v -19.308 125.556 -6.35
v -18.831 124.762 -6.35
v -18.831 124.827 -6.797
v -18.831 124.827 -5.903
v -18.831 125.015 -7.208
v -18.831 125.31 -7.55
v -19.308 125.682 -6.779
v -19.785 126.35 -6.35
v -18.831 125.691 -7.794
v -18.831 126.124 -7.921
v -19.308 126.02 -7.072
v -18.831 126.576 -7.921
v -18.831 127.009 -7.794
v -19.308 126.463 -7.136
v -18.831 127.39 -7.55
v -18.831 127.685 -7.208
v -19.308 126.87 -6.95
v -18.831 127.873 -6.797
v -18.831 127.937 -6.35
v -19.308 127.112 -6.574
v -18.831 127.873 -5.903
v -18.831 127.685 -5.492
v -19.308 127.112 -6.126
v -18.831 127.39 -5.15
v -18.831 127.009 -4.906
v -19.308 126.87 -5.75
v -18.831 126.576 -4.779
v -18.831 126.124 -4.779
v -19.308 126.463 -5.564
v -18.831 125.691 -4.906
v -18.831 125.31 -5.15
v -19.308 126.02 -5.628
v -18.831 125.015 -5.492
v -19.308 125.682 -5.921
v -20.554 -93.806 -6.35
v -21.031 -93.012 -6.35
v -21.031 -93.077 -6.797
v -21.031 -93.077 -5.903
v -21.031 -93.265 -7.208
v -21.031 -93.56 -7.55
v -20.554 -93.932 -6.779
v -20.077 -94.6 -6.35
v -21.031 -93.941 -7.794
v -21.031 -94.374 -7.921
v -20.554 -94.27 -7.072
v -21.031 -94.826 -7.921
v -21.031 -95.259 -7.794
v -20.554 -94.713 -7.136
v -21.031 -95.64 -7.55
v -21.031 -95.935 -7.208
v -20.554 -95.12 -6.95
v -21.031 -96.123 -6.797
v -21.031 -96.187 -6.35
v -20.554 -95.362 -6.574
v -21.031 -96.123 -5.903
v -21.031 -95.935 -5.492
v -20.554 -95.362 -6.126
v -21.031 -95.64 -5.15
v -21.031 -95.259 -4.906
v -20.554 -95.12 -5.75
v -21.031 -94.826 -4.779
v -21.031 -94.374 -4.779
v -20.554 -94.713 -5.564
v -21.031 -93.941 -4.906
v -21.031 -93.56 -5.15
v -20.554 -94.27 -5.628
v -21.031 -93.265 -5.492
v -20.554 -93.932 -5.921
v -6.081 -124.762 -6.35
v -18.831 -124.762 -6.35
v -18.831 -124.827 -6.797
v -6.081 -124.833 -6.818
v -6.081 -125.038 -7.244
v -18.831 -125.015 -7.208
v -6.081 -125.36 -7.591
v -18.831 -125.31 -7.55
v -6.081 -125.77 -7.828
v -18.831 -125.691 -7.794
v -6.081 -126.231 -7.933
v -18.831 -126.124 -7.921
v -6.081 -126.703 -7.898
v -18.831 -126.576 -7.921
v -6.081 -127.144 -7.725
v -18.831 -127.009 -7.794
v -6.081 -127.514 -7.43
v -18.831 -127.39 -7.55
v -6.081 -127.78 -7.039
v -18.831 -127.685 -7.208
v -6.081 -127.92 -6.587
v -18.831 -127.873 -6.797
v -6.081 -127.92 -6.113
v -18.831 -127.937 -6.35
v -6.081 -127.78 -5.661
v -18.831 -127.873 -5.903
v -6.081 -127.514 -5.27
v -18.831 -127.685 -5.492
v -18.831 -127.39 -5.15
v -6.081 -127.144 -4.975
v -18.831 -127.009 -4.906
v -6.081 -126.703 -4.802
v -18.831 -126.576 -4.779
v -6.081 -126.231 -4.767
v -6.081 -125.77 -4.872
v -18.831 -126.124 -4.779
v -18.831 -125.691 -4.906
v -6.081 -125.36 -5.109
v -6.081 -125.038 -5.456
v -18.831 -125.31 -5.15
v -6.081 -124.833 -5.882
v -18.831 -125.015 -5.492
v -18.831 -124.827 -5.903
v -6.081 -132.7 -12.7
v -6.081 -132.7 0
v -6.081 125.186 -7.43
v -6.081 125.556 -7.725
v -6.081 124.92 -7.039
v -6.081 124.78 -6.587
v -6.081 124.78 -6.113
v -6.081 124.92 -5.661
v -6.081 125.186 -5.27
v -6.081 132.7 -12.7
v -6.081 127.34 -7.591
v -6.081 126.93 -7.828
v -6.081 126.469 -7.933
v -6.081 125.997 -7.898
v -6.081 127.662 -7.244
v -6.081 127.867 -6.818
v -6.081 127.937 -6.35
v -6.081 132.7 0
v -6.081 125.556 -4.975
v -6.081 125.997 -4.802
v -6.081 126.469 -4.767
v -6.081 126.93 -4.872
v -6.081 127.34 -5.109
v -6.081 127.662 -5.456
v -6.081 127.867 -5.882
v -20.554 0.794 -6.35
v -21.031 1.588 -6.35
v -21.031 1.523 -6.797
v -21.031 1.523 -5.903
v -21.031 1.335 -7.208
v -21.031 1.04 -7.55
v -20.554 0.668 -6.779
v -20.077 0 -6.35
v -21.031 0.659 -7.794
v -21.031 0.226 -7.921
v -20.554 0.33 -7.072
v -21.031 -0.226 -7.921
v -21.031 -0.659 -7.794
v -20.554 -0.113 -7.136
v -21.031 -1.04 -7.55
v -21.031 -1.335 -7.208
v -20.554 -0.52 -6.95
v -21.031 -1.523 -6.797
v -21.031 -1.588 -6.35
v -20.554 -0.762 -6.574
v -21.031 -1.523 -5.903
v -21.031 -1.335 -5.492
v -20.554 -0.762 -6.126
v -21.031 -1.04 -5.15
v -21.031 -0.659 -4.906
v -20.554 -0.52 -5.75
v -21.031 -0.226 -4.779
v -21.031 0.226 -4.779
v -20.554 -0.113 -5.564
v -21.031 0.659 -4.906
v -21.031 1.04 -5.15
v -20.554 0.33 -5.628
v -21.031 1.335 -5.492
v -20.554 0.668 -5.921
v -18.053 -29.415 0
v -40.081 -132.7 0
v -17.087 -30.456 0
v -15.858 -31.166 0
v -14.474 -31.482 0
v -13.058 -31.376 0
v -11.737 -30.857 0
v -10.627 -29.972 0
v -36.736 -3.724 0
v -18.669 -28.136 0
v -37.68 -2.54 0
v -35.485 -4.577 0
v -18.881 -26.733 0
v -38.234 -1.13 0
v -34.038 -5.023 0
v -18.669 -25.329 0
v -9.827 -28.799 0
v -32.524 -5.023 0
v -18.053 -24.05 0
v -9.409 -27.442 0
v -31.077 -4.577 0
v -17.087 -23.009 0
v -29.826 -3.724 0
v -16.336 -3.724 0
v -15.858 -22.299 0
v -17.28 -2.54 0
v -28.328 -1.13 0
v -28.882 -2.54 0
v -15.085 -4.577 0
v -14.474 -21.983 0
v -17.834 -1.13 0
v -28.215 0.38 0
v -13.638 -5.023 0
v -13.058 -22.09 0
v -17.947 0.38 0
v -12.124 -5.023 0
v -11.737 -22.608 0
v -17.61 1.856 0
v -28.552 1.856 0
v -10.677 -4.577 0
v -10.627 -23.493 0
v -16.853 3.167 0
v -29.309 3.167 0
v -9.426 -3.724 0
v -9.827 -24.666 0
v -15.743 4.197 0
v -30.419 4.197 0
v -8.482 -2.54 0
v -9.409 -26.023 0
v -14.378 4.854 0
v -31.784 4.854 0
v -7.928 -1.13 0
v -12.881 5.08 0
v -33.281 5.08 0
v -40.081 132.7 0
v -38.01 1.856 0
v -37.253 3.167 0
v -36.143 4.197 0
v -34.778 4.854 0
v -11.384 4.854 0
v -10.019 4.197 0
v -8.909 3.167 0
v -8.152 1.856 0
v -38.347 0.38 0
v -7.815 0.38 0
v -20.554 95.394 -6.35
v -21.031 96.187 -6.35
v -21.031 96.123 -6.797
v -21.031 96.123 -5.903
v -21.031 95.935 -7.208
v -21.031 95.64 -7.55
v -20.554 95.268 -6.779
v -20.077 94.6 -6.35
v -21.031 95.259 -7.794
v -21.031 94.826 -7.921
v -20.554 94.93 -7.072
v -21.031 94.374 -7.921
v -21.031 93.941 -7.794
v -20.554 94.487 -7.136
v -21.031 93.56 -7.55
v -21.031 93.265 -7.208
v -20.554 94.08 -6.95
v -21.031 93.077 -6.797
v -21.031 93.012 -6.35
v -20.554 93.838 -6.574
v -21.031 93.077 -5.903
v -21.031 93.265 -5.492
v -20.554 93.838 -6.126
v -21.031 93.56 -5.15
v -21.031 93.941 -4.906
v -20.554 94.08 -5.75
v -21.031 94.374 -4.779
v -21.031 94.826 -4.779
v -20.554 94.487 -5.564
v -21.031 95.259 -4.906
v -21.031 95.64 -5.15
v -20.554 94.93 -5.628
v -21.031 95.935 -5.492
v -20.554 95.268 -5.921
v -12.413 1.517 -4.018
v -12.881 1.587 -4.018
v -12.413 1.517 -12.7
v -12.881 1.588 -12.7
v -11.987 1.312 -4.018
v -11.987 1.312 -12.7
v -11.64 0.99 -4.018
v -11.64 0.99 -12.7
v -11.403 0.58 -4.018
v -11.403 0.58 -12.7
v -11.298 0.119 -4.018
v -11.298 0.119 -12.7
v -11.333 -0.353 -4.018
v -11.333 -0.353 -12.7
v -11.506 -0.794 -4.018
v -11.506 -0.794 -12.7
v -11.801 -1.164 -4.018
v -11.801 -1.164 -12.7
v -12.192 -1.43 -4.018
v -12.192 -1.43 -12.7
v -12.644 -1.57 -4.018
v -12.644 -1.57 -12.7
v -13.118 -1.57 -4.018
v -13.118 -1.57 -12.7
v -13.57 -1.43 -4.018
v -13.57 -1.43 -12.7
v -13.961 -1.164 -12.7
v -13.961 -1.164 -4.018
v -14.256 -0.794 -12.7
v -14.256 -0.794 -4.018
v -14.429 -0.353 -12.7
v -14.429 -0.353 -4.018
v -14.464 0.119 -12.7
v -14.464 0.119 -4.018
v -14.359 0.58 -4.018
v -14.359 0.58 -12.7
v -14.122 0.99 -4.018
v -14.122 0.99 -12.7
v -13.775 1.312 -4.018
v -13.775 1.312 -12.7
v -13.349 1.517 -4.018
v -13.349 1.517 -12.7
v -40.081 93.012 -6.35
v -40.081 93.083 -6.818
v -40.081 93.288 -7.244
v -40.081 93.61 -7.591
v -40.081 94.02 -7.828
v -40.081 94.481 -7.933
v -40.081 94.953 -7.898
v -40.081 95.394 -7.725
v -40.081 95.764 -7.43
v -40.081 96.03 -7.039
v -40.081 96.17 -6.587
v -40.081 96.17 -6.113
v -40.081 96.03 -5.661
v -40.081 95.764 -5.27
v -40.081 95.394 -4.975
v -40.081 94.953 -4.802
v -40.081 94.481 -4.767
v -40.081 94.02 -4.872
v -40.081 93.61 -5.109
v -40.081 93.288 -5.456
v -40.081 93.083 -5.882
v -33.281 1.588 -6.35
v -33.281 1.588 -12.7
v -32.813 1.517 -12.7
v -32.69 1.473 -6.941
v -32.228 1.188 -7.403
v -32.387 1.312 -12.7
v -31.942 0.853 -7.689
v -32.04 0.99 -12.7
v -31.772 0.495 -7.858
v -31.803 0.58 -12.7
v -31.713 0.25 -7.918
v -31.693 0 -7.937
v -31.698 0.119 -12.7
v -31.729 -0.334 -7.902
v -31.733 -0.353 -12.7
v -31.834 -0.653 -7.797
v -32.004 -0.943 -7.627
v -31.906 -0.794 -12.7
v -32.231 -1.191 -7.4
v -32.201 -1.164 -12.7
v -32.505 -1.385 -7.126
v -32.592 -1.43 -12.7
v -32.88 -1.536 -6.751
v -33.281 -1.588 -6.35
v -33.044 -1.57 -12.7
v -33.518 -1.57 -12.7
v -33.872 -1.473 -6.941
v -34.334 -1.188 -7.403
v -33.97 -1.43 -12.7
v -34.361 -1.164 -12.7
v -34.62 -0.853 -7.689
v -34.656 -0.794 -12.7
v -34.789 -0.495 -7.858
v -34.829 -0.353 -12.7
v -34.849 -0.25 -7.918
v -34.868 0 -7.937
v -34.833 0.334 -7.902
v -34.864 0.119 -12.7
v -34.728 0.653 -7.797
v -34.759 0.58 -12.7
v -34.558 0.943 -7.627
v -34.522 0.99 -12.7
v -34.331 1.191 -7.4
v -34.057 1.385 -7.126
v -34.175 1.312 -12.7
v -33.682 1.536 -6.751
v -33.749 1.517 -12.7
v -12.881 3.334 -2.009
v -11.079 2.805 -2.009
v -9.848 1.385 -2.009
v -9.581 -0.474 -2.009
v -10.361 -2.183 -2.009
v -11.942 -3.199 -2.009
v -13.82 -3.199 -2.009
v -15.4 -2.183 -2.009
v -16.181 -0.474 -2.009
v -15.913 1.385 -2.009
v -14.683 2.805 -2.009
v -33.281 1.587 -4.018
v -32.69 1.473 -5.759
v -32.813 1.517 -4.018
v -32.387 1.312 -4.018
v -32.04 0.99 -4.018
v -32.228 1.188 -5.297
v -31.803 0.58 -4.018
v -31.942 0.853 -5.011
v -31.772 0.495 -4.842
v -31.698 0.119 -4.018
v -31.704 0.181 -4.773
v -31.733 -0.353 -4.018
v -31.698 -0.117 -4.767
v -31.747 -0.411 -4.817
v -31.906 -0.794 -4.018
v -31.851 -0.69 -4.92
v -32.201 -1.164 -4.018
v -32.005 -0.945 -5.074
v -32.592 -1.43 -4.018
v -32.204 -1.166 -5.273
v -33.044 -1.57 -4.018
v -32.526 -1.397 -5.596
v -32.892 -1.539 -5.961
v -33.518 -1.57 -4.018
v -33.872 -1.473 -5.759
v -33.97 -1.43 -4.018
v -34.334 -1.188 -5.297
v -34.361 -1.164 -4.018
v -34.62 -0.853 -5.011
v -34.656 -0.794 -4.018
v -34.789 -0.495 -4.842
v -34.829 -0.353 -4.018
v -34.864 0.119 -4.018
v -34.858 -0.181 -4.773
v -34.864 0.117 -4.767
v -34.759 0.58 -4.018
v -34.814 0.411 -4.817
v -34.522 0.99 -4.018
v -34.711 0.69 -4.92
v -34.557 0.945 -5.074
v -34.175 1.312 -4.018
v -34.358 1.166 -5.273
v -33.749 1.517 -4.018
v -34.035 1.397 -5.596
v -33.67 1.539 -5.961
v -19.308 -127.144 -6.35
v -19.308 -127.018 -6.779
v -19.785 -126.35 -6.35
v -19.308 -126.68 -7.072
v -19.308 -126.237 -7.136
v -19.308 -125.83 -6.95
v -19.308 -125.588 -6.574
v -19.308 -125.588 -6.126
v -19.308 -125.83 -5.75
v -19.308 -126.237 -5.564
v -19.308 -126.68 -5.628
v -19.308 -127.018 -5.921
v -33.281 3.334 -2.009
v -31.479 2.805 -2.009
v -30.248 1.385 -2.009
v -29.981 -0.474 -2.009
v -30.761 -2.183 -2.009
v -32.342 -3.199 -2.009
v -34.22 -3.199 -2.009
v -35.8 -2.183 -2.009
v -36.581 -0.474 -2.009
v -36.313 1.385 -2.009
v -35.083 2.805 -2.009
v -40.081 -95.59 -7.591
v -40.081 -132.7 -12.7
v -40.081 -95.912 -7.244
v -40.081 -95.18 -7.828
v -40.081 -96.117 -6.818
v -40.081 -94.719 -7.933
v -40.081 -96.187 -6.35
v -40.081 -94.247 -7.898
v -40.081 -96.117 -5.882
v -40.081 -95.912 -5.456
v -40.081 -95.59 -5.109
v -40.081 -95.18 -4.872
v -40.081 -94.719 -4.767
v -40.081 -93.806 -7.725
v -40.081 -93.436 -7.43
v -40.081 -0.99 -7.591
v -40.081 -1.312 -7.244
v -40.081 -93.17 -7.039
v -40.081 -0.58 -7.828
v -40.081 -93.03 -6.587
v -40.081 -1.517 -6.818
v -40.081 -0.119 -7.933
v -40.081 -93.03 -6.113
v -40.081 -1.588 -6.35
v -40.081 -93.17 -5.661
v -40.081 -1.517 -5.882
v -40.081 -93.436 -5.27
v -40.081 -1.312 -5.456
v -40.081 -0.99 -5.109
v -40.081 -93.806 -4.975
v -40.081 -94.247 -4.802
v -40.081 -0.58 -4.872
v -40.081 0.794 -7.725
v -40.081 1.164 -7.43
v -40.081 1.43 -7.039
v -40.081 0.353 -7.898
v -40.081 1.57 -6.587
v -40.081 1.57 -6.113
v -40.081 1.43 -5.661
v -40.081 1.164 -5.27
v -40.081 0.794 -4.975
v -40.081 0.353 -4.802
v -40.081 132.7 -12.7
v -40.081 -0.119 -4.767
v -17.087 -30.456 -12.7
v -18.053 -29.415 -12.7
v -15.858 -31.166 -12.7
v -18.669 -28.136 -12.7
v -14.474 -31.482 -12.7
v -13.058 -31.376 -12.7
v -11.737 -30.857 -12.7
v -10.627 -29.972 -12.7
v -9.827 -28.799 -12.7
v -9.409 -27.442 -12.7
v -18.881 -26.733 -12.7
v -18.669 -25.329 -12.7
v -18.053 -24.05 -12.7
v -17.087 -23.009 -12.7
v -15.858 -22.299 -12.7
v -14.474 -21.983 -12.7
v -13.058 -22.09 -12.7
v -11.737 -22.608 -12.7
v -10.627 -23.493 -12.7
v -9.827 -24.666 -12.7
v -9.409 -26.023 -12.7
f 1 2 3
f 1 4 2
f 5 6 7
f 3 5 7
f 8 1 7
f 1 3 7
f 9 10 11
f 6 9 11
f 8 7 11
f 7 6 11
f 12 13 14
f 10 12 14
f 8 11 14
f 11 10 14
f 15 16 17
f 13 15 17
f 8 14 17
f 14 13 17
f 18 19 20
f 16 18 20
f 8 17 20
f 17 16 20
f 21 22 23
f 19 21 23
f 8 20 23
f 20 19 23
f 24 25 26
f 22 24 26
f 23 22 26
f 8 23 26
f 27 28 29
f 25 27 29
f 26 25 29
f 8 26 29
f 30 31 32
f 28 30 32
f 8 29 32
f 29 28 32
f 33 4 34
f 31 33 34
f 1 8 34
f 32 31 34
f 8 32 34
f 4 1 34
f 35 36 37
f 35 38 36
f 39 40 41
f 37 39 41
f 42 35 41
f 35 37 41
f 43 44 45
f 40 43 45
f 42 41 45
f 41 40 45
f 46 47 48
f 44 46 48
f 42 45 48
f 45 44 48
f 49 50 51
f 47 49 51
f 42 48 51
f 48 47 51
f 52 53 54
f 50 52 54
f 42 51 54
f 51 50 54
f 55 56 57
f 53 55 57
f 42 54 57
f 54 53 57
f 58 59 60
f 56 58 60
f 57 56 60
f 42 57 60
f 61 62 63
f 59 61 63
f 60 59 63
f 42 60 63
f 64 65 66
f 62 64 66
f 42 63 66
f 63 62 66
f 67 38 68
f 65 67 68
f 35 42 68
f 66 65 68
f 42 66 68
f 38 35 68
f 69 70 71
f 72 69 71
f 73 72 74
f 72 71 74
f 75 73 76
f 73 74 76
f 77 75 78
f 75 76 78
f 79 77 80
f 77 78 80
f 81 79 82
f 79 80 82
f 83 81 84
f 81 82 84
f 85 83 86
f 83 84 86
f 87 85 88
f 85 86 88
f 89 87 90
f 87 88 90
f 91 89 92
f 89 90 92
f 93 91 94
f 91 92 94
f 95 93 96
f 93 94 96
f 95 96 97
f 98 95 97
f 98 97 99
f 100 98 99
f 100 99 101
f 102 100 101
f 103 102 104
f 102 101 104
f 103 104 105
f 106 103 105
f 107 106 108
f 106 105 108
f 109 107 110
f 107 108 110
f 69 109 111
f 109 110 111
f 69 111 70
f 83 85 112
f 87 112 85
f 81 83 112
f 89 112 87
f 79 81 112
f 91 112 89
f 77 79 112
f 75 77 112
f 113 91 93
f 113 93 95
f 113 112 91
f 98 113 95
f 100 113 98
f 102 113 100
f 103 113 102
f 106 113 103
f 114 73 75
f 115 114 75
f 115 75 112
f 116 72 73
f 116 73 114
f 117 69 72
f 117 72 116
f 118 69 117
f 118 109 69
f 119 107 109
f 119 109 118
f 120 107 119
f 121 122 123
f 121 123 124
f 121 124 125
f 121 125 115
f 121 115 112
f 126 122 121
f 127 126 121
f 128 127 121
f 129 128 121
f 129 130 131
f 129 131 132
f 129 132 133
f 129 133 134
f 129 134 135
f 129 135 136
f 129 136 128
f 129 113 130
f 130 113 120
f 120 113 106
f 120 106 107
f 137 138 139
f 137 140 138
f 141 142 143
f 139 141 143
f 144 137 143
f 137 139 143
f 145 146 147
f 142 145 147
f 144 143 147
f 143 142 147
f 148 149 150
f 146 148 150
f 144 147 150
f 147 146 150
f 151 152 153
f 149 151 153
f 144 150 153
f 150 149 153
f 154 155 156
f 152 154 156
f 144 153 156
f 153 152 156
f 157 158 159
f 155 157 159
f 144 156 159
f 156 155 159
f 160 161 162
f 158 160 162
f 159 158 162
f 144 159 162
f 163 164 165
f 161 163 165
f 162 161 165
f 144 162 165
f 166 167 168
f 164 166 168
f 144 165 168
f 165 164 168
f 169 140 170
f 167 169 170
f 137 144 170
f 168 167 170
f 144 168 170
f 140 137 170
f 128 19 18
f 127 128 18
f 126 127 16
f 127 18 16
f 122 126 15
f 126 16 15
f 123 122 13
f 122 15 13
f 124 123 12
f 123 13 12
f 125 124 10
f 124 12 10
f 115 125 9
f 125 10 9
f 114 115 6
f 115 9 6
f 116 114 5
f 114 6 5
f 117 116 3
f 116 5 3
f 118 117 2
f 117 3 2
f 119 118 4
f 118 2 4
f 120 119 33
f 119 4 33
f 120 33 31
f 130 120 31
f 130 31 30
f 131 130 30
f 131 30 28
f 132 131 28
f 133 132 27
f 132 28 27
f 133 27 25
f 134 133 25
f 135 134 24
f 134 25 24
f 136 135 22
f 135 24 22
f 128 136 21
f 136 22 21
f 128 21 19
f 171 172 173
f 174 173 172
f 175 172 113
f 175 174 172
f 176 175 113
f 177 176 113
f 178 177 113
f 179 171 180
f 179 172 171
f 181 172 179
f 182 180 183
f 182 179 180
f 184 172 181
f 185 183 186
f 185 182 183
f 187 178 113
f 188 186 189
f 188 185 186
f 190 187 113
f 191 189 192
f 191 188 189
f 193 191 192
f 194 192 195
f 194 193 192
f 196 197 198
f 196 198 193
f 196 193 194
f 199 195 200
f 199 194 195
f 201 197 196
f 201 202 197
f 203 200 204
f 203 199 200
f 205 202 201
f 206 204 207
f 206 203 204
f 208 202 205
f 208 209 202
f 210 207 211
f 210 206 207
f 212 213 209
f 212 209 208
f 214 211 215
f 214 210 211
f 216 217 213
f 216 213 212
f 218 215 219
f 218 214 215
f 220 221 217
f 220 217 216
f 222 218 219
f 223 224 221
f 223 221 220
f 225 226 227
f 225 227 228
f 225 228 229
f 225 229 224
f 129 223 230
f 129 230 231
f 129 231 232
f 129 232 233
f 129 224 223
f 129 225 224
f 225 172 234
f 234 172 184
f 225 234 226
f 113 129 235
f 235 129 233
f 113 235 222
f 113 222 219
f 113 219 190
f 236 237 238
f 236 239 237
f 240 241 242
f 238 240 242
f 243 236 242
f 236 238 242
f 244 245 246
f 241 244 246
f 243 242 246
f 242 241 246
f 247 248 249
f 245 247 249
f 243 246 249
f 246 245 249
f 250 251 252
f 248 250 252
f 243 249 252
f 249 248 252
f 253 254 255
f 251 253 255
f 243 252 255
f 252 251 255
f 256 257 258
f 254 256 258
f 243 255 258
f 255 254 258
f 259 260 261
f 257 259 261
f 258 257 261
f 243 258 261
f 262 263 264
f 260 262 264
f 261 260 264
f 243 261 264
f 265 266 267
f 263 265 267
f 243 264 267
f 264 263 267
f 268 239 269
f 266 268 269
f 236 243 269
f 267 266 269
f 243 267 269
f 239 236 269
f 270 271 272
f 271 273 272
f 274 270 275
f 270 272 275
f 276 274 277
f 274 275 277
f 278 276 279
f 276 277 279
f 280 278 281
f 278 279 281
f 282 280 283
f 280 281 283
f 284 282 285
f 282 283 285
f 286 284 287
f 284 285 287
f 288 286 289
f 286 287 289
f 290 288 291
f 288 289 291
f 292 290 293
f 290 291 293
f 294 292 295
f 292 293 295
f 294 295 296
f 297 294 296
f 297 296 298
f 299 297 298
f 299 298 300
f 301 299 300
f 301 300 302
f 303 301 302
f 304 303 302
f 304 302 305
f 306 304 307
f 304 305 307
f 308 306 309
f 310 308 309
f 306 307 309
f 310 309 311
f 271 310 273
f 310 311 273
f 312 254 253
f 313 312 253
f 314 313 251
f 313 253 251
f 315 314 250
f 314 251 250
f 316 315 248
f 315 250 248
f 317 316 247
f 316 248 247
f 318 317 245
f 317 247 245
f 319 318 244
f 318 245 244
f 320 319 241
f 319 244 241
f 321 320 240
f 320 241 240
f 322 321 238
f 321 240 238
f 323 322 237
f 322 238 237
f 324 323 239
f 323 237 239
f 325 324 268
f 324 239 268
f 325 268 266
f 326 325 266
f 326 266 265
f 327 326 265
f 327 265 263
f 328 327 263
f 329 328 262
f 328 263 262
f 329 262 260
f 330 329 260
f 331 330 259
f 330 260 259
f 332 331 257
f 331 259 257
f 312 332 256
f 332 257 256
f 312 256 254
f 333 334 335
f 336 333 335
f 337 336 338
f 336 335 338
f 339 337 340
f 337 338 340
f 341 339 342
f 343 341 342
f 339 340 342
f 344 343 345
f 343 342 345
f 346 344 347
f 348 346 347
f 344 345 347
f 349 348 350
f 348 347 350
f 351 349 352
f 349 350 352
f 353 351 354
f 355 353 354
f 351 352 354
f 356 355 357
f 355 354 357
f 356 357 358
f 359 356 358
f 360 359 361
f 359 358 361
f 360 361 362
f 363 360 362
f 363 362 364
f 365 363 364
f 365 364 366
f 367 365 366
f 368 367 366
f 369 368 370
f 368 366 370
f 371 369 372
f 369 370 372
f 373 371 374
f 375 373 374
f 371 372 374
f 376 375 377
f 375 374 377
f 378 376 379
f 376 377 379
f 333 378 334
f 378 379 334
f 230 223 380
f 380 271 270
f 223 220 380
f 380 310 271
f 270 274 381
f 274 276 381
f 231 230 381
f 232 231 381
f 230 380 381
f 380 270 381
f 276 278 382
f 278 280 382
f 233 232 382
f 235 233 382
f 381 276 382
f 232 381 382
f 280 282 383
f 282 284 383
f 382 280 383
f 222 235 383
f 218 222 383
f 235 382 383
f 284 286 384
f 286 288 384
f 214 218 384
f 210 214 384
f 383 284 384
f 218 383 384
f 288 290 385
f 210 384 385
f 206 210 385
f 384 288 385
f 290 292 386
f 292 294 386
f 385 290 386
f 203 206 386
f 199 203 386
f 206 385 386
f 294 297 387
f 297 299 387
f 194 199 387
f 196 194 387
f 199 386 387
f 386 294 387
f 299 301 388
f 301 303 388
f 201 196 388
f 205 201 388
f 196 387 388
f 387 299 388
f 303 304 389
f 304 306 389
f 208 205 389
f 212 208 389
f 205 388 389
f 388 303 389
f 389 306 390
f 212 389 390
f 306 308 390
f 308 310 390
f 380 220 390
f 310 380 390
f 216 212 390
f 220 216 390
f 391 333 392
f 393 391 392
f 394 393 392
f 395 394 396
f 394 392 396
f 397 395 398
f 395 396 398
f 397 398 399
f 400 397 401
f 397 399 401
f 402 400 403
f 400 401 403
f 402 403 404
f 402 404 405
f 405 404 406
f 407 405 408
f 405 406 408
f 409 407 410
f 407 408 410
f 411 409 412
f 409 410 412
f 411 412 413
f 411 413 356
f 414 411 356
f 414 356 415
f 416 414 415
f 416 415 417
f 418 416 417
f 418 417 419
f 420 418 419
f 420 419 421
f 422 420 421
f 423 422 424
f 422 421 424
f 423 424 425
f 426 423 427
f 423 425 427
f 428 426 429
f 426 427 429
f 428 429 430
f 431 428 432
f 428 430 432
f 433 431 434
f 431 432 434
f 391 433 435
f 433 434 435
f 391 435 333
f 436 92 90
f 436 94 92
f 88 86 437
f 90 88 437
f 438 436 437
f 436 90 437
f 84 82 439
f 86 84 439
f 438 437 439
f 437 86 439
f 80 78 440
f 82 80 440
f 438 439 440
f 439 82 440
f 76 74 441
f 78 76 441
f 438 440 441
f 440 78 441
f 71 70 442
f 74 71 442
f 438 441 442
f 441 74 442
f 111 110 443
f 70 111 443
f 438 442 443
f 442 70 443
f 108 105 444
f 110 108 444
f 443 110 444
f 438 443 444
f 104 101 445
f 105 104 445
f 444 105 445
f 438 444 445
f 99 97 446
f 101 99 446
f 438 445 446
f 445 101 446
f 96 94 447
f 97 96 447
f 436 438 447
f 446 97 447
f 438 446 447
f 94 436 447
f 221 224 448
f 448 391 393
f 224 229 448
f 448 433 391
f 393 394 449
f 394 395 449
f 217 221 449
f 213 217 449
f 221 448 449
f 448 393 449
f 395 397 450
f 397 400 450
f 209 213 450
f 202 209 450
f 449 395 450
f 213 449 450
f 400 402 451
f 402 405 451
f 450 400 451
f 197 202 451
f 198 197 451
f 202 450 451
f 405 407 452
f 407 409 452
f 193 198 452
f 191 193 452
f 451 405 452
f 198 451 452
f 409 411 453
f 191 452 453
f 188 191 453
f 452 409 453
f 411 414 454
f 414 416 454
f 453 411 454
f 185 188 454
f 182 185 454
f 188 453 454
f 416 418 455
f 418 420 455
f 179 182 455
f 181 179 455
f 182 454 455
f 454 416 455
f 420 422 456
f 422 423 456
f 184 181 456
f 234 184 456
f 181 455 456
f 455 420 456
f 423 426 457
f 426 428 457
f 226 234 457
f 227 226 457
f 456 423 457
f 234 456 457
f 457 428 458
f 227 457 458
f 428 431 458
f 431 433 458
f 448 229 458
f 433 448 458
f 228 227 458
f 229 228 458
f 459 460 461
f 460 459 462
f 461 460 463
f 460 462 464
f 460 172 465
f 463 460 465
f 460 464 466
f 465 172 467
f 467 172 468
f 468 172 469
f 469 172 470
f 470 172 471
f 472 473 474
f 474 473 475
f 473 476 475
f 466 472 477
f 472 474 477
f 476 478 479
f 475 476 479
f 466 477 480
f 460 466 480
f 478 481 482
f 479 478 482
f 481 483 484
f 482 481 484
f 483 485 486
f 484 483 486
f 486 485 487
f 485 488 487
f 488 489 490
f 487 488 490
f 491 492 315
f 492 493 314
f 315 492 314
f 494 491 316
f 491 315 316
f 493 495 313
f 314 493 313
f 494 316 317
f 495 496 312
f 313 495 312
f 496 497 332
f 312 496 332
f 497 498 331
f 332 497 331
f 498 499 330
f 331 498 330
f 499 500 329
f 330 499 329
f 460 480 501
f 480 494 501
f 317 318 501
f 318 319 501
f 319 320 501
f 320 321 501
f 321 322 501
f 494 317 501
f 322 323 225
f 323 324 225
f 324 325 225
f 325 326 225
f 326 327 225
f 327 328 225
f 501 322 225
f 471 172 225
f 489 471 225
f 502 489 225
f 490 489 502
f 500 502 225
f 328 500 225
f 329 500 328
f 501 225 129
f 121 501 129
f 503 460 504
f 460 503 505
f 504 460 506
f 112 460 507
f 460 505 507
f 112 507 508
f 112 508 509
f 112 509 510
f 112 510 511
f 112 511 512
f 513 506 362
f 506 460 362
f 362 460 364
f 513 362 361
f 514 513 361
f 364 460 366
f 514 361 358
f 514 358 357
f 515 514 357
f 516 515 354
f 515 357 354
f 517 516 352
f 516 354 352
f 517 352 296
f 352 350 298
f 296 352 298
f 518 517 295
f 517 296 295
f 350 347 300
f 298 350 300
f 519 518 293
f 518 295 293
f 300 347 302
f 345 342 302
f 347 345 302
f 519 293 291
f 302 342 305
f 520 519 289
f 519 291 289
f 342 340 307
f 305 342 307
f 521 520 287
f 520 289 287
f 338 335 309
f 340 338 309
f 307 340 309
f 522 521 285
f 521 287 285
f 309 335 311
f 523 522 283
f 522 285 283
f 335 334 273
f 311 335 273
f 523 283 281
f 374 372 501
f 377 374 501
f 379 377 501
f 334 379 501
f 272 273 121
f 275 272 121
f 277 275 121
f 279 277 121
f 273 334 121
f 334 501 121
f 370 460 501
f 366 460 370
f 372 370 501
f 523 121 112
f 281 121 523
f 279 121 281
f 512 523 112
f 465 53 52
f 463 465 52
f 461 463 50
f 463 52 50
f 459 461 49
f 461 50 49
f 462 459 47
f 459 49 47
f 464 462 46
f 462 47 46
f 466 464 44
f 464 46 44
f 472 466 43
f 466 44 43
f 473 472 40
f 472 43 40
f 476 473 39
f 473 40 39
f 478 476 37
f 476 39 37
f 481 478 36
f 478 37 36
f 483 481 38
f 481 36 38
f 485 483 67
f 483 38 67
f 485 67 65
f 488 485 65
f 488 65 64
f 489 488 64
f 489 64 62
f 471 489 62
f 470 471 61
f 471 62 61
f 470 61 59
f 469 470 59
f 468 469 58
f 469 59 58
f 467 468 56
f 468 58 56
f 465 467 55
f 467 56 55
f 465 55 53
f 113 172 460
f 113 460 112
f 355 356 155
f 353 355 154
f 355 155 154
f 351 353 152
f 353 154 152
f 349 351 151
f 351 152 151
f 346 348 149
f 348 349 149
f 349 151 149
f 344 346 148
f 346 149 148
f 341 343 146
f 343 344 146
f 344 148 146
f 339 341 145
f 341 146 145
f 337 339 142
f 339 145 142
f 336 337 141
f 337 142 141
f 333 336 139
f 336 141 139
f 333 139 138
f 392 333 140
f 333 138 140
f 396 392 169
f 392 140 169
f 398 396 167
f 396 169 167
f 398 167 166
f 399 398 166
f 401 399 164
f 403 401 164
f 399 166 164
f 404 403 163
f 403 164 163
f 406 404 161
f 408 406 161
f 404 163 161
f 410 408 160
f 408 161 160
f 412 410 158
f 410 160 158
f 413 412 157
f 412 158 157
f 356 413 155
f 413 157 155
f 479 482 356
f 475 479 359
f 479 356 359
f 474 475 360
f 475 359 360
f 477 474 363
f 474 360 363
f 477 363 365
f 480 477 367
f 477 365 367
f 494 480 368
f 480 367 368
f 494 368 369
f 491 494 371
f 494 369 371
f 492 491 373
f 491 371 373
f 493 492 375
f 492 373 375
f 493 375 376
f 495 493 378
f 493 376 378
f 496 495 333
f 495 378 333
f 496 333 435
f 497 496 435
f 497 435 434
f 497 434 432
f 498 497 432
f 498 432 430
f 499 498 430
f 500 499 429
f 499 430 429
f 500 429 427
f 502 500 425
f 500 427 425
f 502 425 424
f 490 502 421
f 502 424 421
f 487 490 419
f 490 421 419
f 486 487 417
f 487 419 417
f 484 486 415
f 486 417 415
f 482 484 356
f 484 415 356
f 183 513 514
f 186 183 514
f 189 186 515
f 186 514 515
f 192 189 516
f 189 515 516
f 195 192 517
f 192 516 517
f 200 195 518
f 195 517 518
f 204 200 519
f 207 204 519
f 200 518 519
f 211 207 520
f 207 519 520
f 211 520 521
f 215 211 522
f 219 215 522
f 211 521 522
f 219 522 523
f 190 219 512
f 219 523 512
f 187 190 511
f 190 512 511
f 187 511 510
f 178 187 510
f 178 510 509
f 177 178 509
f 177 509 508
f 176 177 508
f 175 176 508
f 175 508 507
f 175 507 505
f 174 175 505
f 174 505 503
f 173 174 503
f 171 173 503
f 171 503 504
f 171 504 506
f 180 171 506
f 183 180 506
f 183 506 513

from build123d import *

# Parameters (mm, degrees)
SKETCH1_W                    = 34
SKETCH1_H                    = 265.399999988
BOSS_EXTRUDE1_DEPTH          = 12.7
F_3_8_0_375_DIAMETER_HOLE1_D = 9.525
HOLE1_D                      = 3.175
HOLE1_DEPTH                  = 31.75
HOLE1_CSINK_D                = 10.16
HOLE1_CSINK_ANGLE            = 82
HOLE1_TIP                    = 0.953866233
HOLE3_D                      = 3.175
HOLE3_DEPTH                  = 31.75
HOLE3_CSINK_D                = 10.16
HOLE3_CSINK_ANGLE            = 82
HOLE3_TIP                    = 0.953866233
HOLE4_D                      = 3.175
HOLE4_DEPTH                  = 31.75
HOLE4_CSINK_D                = 10.16
HOLE4_CSINK_ANGLE            = 82
HOLE4_TIP                    = 0.953866233


with BuildPart() as part:
    # Sketch1 → Boss-Extrude1 (new body)
    with BuildSketch(Plane.XY):
        with Locations((-23.08092085, 0)):
            Rectangle(SKETCH1_W, SKETCH1_H)
    extrude(amount=-BOSS_EXTRUDE1_DEPTH)

    # 3/8 (0.375) Diameter Hole1 (through all)
    with Locations(Plane.XY):
        with Locations((-14.118005489, -26.732654045)):
            Hole(F_3_8_0_375_DIAMETER_HOLE1_D / 2)

    # Hole1
    with Locations(Plane(origin=(12.91907915, 0, 155.024290059), x_dir=(0, -1, 0), z_dir=(1, 0, 0))):
        with Locations((126.349999994, 161.374290059), (146.083333327, 4.074290059), (172.166666661, 4.074290059), (126.349999994, 34.524290059), (126.349999994, 130.924290059), (-172.166666661, 4.074290059), (-146.083333327, 4.074290059), (-126.349999994, 34.524290059), (-126.349999994, 130.924290059), (-126.349999994, 161.374290059)):
            CounterSinkHole(HOLE1_D / 2, HOLE1_CSINK_D / 2, depth=HOLE1_DEPTH, counter_sink_angle=HOLE1_CSINK_ANGLE)
            with Locations((0, 0, -(HOLE1_DEPTH + HOLE1_TIP / 2))):  # 118° drill point
                Cone(0, HOLE1_D / 2, HOLE1_TIP, mode=Mode.SUBTRACT)

    # Hole3
    with Locations(Plane(origin=(-195.367659426, 0, 0), x_dir=(0, -1, 0), z_dir=(0, 0, 1))):
        with Locations((0, 162.086738577), (0, 182.486738577)):
            CounterSinkHole(HOLE3_D / 2, HOLE3_CSINK_D / 2, depth=HOLE3_DEPTH, counter_sink_angle=HOLE3_CSINK_ANGLE)
            with Locations((0, 0, -(HOLE3_DEPTH + HOLE3_TIP / 2))):  # 118° drill point
                Cone(0, HOLE3_D / 2, HOLE3_TIP, mode=Mode.SUBTRACT)

    # Hole4
    with Locations(Plane(origin=(-52.78092085, 0, 155.024290059), x_dir=(0, 1, 0), z_dir=(-1, 0, 0))):
        with Locations((-207.774999994, 333.02141023), (-207.774999994, 225.48903684), (-207.774999994, 137.424290059), (-172.166666661, 4.074290059), (-146.083333327, 4.074290059), (-94.599999994, 161.374290059), (0, 161.374290059), (94.599999994, 161.374290059), (146.083333327, 4.074290059), (172.166666661, 4.074290059), (207.774999994, 137.424290059), (207.774999994, 225.48903684), (207.774999994, 333.02141023), (166.795833328, 301.970350905), (40.979166666, 301.970350905), (-40.979166666, 301.970350905), (-166.795833328, 301.970350905), (0, 193.124290059), (0, 301.970350905), (0, 412.366411751), (-126.349999994, 106.824290059), (-126.349999994, 58.624290059), (126.349999994, 58.624290059), (126.349999994, 106.824290059)):
            CounterSinkHole(HOLE4_D / 2, HOLE4_CSINK_D / 2, depth=HOLE4_DEPTH, counter_sink_angle=HOLE4_CSINK_ANGLE)
            with Locations((0, 0, -(HOLE4_DEPTH + HOLE4_TIP / 2))):  # 118° drill point
                Cone(0, HOLE4_D / 2, HOLE4_TIP, mode=Mode.SUBTRACT)


solid = part.part
